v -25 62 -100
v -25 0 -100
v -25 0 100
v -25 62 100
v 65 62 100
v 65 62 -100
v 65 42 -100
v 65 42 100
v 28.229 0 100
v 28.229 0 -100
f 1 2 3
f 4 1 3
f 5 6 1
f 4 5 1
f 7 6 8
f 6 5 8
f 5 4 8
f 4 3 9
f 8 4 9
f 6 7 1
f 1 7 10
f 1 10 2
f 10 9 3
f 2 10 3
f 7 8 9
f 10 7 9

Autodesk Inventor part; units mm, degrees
ref_plane "YZ Plane" through (0, 0, 0) normal (1, 0, 0) x (0, 1, 0)
ref_plane "XZ Plane" through (0, 0, 0) normal (0, 1, 0) x (-1, 0, 0)
ref_plane "XY Plane" through (0, 0, 0) normal (0, 0, 1) x (1, 0, 0)
sketch "Sketch1" plane through (0, 0, 0) normal (0, 1, 0) x (-1, 0, 0)
  line L0 (25, 100) -> (-25, 100)
  line L1 (-25, 100) -> (-25, -100)
  line L2 (-25, -100) -> (25, -100)
  line L3 (25, -100) -> (25, 100)
  line L4 (25, 100) -> (-25, -100) construction
  line L5 (-25, 100) -> (25, -100) construction
  point P0 (0, 0)
  dimension "d0" = 50
  dimension "d1" = 200
extrude "Extrusion1" add sketch "Sketch1" along normal blind 62
sketch "Sketch2" plane through (-25, 0, 100) normal (0, 0, 1) x (1, 0, 0)
  line L0 (50, 62) -> (0, 62) projected
  line L1 (50, 62) -> (90, 62)
  line L2 (90, 62) -> (90, 42)
  line L3 (90, 42) -> (53.2289, 0)
  line L4 (53.2289, 0) -> (50, 0)
  line L5 (50, 62) -> (50, 0)
  point P0 (25, 0)
  dimension "d4" = 40
  dimension "d5" = 20
  dimension "d6" = 90
extrude "Extrusion2" add sketch "Sketch2" against normal up to surface (200 mm away)
sketch "Sketch3" plane through (0, 62, 0) normal (0, 1, 0) x (1, 0, 0)
  line L0 (-25, 100) -> (-25, -100) projected
  line L1 (-25, -100) -> (-25, 100)
  line L2 (-25, 100) -> (-25, 80)
  line L3 (-25, 80) -> (-76.9615, 50)
  line L4 (-25, -100) -> (-25, -80)
  line L5 (-25, -80) -> (-76.9615, -50)
  line L6 (-76.9615, -50) -> (-76.9615, 50)
  circle A0 centre (-76.9615, 0) radius 49.9974
  circle A1 centre (-126.9564, -0.5064) radius 49.9974
  line L7 (-76.9615, -50) -> (-126.45, -50.5013)
  line L8 (-127.4628, 49.4885) -> (-76.9615, 50)
  point P0 (0, 0)
  point P1 (-76.9615, 49.9974)
  point P2 (-77.4679, 49.9949)
  point P3 (-76.9615, -1.0128)
  dimension "d9" = 20
  dimension "d10" = 60
  dimension "d11" = 120
  dimension "d12" = 20
  dimension "d13" = 60
  dimension "d14" = 120
extrude "Extrusion3" add sketch "Sketch3" against normal blind 62
sketch "Sketch4" plane through (0, 62, 0) normal (0, 1, 0) x (1, 0, 0)
  line L0 (-25, -100) -> (28.2289, -100) projected
  line L1 (-25, 100) -> (-25, 80) projected
  line L2 (-25, -100) -> (-25, 100)
  line L3 (-25, 100) -> (29.4775, 197.567)
  line L4 (29.4775, 197.567) -> (135.6867, 127.811)
  line L5 (135.6867, 127.811) -> (135.6867, -104.409)
  line L6 (135.6867, -104.409) -> (110.0345, -245.7212)
  line L7 (110.0345, -245.7212) -> (-5.1754, -156.6135)
  line L8 (-5.1754, -156.6135) -> (-25, -100)
  line L9 (-76.9615, -50) -> (-76.9615, 49.9974)
  line L10 (-76.9615, 49.9974) -> (-143.8651, 145.0549)
  line L11 (-143.8651, 145.0549) -> (-248.9816, -0.0013)
  line L12 (-248.9816, -0.0013) -> (-240.1494, -166.1828)
  line L13 (-240.1494, -166.1828) -> (-110.4133, -169.4443)
  line L14 (-110.4133, -169.4443) -> (-76.9615, -50)
  line L15 (-110.4133, -169.4443) -> (-5.1754, -156.6135)
  line L16 (-143.8651, 145.0549) -> (29.4775, 197.567)
  point P0 (0, 0)
extrude "Extrusion4" cut sketch "Sketch4" against normal blind 62 contours L10 L9 L14 L13 L12 L11
extrude "Extrusion5" cut sketch "Sketch4" against normal blind 62 contours L1 L2 L8 L15 L14 L9 L10 L16 L3
properties part number "piece1" material "Acrylic, Clear"
